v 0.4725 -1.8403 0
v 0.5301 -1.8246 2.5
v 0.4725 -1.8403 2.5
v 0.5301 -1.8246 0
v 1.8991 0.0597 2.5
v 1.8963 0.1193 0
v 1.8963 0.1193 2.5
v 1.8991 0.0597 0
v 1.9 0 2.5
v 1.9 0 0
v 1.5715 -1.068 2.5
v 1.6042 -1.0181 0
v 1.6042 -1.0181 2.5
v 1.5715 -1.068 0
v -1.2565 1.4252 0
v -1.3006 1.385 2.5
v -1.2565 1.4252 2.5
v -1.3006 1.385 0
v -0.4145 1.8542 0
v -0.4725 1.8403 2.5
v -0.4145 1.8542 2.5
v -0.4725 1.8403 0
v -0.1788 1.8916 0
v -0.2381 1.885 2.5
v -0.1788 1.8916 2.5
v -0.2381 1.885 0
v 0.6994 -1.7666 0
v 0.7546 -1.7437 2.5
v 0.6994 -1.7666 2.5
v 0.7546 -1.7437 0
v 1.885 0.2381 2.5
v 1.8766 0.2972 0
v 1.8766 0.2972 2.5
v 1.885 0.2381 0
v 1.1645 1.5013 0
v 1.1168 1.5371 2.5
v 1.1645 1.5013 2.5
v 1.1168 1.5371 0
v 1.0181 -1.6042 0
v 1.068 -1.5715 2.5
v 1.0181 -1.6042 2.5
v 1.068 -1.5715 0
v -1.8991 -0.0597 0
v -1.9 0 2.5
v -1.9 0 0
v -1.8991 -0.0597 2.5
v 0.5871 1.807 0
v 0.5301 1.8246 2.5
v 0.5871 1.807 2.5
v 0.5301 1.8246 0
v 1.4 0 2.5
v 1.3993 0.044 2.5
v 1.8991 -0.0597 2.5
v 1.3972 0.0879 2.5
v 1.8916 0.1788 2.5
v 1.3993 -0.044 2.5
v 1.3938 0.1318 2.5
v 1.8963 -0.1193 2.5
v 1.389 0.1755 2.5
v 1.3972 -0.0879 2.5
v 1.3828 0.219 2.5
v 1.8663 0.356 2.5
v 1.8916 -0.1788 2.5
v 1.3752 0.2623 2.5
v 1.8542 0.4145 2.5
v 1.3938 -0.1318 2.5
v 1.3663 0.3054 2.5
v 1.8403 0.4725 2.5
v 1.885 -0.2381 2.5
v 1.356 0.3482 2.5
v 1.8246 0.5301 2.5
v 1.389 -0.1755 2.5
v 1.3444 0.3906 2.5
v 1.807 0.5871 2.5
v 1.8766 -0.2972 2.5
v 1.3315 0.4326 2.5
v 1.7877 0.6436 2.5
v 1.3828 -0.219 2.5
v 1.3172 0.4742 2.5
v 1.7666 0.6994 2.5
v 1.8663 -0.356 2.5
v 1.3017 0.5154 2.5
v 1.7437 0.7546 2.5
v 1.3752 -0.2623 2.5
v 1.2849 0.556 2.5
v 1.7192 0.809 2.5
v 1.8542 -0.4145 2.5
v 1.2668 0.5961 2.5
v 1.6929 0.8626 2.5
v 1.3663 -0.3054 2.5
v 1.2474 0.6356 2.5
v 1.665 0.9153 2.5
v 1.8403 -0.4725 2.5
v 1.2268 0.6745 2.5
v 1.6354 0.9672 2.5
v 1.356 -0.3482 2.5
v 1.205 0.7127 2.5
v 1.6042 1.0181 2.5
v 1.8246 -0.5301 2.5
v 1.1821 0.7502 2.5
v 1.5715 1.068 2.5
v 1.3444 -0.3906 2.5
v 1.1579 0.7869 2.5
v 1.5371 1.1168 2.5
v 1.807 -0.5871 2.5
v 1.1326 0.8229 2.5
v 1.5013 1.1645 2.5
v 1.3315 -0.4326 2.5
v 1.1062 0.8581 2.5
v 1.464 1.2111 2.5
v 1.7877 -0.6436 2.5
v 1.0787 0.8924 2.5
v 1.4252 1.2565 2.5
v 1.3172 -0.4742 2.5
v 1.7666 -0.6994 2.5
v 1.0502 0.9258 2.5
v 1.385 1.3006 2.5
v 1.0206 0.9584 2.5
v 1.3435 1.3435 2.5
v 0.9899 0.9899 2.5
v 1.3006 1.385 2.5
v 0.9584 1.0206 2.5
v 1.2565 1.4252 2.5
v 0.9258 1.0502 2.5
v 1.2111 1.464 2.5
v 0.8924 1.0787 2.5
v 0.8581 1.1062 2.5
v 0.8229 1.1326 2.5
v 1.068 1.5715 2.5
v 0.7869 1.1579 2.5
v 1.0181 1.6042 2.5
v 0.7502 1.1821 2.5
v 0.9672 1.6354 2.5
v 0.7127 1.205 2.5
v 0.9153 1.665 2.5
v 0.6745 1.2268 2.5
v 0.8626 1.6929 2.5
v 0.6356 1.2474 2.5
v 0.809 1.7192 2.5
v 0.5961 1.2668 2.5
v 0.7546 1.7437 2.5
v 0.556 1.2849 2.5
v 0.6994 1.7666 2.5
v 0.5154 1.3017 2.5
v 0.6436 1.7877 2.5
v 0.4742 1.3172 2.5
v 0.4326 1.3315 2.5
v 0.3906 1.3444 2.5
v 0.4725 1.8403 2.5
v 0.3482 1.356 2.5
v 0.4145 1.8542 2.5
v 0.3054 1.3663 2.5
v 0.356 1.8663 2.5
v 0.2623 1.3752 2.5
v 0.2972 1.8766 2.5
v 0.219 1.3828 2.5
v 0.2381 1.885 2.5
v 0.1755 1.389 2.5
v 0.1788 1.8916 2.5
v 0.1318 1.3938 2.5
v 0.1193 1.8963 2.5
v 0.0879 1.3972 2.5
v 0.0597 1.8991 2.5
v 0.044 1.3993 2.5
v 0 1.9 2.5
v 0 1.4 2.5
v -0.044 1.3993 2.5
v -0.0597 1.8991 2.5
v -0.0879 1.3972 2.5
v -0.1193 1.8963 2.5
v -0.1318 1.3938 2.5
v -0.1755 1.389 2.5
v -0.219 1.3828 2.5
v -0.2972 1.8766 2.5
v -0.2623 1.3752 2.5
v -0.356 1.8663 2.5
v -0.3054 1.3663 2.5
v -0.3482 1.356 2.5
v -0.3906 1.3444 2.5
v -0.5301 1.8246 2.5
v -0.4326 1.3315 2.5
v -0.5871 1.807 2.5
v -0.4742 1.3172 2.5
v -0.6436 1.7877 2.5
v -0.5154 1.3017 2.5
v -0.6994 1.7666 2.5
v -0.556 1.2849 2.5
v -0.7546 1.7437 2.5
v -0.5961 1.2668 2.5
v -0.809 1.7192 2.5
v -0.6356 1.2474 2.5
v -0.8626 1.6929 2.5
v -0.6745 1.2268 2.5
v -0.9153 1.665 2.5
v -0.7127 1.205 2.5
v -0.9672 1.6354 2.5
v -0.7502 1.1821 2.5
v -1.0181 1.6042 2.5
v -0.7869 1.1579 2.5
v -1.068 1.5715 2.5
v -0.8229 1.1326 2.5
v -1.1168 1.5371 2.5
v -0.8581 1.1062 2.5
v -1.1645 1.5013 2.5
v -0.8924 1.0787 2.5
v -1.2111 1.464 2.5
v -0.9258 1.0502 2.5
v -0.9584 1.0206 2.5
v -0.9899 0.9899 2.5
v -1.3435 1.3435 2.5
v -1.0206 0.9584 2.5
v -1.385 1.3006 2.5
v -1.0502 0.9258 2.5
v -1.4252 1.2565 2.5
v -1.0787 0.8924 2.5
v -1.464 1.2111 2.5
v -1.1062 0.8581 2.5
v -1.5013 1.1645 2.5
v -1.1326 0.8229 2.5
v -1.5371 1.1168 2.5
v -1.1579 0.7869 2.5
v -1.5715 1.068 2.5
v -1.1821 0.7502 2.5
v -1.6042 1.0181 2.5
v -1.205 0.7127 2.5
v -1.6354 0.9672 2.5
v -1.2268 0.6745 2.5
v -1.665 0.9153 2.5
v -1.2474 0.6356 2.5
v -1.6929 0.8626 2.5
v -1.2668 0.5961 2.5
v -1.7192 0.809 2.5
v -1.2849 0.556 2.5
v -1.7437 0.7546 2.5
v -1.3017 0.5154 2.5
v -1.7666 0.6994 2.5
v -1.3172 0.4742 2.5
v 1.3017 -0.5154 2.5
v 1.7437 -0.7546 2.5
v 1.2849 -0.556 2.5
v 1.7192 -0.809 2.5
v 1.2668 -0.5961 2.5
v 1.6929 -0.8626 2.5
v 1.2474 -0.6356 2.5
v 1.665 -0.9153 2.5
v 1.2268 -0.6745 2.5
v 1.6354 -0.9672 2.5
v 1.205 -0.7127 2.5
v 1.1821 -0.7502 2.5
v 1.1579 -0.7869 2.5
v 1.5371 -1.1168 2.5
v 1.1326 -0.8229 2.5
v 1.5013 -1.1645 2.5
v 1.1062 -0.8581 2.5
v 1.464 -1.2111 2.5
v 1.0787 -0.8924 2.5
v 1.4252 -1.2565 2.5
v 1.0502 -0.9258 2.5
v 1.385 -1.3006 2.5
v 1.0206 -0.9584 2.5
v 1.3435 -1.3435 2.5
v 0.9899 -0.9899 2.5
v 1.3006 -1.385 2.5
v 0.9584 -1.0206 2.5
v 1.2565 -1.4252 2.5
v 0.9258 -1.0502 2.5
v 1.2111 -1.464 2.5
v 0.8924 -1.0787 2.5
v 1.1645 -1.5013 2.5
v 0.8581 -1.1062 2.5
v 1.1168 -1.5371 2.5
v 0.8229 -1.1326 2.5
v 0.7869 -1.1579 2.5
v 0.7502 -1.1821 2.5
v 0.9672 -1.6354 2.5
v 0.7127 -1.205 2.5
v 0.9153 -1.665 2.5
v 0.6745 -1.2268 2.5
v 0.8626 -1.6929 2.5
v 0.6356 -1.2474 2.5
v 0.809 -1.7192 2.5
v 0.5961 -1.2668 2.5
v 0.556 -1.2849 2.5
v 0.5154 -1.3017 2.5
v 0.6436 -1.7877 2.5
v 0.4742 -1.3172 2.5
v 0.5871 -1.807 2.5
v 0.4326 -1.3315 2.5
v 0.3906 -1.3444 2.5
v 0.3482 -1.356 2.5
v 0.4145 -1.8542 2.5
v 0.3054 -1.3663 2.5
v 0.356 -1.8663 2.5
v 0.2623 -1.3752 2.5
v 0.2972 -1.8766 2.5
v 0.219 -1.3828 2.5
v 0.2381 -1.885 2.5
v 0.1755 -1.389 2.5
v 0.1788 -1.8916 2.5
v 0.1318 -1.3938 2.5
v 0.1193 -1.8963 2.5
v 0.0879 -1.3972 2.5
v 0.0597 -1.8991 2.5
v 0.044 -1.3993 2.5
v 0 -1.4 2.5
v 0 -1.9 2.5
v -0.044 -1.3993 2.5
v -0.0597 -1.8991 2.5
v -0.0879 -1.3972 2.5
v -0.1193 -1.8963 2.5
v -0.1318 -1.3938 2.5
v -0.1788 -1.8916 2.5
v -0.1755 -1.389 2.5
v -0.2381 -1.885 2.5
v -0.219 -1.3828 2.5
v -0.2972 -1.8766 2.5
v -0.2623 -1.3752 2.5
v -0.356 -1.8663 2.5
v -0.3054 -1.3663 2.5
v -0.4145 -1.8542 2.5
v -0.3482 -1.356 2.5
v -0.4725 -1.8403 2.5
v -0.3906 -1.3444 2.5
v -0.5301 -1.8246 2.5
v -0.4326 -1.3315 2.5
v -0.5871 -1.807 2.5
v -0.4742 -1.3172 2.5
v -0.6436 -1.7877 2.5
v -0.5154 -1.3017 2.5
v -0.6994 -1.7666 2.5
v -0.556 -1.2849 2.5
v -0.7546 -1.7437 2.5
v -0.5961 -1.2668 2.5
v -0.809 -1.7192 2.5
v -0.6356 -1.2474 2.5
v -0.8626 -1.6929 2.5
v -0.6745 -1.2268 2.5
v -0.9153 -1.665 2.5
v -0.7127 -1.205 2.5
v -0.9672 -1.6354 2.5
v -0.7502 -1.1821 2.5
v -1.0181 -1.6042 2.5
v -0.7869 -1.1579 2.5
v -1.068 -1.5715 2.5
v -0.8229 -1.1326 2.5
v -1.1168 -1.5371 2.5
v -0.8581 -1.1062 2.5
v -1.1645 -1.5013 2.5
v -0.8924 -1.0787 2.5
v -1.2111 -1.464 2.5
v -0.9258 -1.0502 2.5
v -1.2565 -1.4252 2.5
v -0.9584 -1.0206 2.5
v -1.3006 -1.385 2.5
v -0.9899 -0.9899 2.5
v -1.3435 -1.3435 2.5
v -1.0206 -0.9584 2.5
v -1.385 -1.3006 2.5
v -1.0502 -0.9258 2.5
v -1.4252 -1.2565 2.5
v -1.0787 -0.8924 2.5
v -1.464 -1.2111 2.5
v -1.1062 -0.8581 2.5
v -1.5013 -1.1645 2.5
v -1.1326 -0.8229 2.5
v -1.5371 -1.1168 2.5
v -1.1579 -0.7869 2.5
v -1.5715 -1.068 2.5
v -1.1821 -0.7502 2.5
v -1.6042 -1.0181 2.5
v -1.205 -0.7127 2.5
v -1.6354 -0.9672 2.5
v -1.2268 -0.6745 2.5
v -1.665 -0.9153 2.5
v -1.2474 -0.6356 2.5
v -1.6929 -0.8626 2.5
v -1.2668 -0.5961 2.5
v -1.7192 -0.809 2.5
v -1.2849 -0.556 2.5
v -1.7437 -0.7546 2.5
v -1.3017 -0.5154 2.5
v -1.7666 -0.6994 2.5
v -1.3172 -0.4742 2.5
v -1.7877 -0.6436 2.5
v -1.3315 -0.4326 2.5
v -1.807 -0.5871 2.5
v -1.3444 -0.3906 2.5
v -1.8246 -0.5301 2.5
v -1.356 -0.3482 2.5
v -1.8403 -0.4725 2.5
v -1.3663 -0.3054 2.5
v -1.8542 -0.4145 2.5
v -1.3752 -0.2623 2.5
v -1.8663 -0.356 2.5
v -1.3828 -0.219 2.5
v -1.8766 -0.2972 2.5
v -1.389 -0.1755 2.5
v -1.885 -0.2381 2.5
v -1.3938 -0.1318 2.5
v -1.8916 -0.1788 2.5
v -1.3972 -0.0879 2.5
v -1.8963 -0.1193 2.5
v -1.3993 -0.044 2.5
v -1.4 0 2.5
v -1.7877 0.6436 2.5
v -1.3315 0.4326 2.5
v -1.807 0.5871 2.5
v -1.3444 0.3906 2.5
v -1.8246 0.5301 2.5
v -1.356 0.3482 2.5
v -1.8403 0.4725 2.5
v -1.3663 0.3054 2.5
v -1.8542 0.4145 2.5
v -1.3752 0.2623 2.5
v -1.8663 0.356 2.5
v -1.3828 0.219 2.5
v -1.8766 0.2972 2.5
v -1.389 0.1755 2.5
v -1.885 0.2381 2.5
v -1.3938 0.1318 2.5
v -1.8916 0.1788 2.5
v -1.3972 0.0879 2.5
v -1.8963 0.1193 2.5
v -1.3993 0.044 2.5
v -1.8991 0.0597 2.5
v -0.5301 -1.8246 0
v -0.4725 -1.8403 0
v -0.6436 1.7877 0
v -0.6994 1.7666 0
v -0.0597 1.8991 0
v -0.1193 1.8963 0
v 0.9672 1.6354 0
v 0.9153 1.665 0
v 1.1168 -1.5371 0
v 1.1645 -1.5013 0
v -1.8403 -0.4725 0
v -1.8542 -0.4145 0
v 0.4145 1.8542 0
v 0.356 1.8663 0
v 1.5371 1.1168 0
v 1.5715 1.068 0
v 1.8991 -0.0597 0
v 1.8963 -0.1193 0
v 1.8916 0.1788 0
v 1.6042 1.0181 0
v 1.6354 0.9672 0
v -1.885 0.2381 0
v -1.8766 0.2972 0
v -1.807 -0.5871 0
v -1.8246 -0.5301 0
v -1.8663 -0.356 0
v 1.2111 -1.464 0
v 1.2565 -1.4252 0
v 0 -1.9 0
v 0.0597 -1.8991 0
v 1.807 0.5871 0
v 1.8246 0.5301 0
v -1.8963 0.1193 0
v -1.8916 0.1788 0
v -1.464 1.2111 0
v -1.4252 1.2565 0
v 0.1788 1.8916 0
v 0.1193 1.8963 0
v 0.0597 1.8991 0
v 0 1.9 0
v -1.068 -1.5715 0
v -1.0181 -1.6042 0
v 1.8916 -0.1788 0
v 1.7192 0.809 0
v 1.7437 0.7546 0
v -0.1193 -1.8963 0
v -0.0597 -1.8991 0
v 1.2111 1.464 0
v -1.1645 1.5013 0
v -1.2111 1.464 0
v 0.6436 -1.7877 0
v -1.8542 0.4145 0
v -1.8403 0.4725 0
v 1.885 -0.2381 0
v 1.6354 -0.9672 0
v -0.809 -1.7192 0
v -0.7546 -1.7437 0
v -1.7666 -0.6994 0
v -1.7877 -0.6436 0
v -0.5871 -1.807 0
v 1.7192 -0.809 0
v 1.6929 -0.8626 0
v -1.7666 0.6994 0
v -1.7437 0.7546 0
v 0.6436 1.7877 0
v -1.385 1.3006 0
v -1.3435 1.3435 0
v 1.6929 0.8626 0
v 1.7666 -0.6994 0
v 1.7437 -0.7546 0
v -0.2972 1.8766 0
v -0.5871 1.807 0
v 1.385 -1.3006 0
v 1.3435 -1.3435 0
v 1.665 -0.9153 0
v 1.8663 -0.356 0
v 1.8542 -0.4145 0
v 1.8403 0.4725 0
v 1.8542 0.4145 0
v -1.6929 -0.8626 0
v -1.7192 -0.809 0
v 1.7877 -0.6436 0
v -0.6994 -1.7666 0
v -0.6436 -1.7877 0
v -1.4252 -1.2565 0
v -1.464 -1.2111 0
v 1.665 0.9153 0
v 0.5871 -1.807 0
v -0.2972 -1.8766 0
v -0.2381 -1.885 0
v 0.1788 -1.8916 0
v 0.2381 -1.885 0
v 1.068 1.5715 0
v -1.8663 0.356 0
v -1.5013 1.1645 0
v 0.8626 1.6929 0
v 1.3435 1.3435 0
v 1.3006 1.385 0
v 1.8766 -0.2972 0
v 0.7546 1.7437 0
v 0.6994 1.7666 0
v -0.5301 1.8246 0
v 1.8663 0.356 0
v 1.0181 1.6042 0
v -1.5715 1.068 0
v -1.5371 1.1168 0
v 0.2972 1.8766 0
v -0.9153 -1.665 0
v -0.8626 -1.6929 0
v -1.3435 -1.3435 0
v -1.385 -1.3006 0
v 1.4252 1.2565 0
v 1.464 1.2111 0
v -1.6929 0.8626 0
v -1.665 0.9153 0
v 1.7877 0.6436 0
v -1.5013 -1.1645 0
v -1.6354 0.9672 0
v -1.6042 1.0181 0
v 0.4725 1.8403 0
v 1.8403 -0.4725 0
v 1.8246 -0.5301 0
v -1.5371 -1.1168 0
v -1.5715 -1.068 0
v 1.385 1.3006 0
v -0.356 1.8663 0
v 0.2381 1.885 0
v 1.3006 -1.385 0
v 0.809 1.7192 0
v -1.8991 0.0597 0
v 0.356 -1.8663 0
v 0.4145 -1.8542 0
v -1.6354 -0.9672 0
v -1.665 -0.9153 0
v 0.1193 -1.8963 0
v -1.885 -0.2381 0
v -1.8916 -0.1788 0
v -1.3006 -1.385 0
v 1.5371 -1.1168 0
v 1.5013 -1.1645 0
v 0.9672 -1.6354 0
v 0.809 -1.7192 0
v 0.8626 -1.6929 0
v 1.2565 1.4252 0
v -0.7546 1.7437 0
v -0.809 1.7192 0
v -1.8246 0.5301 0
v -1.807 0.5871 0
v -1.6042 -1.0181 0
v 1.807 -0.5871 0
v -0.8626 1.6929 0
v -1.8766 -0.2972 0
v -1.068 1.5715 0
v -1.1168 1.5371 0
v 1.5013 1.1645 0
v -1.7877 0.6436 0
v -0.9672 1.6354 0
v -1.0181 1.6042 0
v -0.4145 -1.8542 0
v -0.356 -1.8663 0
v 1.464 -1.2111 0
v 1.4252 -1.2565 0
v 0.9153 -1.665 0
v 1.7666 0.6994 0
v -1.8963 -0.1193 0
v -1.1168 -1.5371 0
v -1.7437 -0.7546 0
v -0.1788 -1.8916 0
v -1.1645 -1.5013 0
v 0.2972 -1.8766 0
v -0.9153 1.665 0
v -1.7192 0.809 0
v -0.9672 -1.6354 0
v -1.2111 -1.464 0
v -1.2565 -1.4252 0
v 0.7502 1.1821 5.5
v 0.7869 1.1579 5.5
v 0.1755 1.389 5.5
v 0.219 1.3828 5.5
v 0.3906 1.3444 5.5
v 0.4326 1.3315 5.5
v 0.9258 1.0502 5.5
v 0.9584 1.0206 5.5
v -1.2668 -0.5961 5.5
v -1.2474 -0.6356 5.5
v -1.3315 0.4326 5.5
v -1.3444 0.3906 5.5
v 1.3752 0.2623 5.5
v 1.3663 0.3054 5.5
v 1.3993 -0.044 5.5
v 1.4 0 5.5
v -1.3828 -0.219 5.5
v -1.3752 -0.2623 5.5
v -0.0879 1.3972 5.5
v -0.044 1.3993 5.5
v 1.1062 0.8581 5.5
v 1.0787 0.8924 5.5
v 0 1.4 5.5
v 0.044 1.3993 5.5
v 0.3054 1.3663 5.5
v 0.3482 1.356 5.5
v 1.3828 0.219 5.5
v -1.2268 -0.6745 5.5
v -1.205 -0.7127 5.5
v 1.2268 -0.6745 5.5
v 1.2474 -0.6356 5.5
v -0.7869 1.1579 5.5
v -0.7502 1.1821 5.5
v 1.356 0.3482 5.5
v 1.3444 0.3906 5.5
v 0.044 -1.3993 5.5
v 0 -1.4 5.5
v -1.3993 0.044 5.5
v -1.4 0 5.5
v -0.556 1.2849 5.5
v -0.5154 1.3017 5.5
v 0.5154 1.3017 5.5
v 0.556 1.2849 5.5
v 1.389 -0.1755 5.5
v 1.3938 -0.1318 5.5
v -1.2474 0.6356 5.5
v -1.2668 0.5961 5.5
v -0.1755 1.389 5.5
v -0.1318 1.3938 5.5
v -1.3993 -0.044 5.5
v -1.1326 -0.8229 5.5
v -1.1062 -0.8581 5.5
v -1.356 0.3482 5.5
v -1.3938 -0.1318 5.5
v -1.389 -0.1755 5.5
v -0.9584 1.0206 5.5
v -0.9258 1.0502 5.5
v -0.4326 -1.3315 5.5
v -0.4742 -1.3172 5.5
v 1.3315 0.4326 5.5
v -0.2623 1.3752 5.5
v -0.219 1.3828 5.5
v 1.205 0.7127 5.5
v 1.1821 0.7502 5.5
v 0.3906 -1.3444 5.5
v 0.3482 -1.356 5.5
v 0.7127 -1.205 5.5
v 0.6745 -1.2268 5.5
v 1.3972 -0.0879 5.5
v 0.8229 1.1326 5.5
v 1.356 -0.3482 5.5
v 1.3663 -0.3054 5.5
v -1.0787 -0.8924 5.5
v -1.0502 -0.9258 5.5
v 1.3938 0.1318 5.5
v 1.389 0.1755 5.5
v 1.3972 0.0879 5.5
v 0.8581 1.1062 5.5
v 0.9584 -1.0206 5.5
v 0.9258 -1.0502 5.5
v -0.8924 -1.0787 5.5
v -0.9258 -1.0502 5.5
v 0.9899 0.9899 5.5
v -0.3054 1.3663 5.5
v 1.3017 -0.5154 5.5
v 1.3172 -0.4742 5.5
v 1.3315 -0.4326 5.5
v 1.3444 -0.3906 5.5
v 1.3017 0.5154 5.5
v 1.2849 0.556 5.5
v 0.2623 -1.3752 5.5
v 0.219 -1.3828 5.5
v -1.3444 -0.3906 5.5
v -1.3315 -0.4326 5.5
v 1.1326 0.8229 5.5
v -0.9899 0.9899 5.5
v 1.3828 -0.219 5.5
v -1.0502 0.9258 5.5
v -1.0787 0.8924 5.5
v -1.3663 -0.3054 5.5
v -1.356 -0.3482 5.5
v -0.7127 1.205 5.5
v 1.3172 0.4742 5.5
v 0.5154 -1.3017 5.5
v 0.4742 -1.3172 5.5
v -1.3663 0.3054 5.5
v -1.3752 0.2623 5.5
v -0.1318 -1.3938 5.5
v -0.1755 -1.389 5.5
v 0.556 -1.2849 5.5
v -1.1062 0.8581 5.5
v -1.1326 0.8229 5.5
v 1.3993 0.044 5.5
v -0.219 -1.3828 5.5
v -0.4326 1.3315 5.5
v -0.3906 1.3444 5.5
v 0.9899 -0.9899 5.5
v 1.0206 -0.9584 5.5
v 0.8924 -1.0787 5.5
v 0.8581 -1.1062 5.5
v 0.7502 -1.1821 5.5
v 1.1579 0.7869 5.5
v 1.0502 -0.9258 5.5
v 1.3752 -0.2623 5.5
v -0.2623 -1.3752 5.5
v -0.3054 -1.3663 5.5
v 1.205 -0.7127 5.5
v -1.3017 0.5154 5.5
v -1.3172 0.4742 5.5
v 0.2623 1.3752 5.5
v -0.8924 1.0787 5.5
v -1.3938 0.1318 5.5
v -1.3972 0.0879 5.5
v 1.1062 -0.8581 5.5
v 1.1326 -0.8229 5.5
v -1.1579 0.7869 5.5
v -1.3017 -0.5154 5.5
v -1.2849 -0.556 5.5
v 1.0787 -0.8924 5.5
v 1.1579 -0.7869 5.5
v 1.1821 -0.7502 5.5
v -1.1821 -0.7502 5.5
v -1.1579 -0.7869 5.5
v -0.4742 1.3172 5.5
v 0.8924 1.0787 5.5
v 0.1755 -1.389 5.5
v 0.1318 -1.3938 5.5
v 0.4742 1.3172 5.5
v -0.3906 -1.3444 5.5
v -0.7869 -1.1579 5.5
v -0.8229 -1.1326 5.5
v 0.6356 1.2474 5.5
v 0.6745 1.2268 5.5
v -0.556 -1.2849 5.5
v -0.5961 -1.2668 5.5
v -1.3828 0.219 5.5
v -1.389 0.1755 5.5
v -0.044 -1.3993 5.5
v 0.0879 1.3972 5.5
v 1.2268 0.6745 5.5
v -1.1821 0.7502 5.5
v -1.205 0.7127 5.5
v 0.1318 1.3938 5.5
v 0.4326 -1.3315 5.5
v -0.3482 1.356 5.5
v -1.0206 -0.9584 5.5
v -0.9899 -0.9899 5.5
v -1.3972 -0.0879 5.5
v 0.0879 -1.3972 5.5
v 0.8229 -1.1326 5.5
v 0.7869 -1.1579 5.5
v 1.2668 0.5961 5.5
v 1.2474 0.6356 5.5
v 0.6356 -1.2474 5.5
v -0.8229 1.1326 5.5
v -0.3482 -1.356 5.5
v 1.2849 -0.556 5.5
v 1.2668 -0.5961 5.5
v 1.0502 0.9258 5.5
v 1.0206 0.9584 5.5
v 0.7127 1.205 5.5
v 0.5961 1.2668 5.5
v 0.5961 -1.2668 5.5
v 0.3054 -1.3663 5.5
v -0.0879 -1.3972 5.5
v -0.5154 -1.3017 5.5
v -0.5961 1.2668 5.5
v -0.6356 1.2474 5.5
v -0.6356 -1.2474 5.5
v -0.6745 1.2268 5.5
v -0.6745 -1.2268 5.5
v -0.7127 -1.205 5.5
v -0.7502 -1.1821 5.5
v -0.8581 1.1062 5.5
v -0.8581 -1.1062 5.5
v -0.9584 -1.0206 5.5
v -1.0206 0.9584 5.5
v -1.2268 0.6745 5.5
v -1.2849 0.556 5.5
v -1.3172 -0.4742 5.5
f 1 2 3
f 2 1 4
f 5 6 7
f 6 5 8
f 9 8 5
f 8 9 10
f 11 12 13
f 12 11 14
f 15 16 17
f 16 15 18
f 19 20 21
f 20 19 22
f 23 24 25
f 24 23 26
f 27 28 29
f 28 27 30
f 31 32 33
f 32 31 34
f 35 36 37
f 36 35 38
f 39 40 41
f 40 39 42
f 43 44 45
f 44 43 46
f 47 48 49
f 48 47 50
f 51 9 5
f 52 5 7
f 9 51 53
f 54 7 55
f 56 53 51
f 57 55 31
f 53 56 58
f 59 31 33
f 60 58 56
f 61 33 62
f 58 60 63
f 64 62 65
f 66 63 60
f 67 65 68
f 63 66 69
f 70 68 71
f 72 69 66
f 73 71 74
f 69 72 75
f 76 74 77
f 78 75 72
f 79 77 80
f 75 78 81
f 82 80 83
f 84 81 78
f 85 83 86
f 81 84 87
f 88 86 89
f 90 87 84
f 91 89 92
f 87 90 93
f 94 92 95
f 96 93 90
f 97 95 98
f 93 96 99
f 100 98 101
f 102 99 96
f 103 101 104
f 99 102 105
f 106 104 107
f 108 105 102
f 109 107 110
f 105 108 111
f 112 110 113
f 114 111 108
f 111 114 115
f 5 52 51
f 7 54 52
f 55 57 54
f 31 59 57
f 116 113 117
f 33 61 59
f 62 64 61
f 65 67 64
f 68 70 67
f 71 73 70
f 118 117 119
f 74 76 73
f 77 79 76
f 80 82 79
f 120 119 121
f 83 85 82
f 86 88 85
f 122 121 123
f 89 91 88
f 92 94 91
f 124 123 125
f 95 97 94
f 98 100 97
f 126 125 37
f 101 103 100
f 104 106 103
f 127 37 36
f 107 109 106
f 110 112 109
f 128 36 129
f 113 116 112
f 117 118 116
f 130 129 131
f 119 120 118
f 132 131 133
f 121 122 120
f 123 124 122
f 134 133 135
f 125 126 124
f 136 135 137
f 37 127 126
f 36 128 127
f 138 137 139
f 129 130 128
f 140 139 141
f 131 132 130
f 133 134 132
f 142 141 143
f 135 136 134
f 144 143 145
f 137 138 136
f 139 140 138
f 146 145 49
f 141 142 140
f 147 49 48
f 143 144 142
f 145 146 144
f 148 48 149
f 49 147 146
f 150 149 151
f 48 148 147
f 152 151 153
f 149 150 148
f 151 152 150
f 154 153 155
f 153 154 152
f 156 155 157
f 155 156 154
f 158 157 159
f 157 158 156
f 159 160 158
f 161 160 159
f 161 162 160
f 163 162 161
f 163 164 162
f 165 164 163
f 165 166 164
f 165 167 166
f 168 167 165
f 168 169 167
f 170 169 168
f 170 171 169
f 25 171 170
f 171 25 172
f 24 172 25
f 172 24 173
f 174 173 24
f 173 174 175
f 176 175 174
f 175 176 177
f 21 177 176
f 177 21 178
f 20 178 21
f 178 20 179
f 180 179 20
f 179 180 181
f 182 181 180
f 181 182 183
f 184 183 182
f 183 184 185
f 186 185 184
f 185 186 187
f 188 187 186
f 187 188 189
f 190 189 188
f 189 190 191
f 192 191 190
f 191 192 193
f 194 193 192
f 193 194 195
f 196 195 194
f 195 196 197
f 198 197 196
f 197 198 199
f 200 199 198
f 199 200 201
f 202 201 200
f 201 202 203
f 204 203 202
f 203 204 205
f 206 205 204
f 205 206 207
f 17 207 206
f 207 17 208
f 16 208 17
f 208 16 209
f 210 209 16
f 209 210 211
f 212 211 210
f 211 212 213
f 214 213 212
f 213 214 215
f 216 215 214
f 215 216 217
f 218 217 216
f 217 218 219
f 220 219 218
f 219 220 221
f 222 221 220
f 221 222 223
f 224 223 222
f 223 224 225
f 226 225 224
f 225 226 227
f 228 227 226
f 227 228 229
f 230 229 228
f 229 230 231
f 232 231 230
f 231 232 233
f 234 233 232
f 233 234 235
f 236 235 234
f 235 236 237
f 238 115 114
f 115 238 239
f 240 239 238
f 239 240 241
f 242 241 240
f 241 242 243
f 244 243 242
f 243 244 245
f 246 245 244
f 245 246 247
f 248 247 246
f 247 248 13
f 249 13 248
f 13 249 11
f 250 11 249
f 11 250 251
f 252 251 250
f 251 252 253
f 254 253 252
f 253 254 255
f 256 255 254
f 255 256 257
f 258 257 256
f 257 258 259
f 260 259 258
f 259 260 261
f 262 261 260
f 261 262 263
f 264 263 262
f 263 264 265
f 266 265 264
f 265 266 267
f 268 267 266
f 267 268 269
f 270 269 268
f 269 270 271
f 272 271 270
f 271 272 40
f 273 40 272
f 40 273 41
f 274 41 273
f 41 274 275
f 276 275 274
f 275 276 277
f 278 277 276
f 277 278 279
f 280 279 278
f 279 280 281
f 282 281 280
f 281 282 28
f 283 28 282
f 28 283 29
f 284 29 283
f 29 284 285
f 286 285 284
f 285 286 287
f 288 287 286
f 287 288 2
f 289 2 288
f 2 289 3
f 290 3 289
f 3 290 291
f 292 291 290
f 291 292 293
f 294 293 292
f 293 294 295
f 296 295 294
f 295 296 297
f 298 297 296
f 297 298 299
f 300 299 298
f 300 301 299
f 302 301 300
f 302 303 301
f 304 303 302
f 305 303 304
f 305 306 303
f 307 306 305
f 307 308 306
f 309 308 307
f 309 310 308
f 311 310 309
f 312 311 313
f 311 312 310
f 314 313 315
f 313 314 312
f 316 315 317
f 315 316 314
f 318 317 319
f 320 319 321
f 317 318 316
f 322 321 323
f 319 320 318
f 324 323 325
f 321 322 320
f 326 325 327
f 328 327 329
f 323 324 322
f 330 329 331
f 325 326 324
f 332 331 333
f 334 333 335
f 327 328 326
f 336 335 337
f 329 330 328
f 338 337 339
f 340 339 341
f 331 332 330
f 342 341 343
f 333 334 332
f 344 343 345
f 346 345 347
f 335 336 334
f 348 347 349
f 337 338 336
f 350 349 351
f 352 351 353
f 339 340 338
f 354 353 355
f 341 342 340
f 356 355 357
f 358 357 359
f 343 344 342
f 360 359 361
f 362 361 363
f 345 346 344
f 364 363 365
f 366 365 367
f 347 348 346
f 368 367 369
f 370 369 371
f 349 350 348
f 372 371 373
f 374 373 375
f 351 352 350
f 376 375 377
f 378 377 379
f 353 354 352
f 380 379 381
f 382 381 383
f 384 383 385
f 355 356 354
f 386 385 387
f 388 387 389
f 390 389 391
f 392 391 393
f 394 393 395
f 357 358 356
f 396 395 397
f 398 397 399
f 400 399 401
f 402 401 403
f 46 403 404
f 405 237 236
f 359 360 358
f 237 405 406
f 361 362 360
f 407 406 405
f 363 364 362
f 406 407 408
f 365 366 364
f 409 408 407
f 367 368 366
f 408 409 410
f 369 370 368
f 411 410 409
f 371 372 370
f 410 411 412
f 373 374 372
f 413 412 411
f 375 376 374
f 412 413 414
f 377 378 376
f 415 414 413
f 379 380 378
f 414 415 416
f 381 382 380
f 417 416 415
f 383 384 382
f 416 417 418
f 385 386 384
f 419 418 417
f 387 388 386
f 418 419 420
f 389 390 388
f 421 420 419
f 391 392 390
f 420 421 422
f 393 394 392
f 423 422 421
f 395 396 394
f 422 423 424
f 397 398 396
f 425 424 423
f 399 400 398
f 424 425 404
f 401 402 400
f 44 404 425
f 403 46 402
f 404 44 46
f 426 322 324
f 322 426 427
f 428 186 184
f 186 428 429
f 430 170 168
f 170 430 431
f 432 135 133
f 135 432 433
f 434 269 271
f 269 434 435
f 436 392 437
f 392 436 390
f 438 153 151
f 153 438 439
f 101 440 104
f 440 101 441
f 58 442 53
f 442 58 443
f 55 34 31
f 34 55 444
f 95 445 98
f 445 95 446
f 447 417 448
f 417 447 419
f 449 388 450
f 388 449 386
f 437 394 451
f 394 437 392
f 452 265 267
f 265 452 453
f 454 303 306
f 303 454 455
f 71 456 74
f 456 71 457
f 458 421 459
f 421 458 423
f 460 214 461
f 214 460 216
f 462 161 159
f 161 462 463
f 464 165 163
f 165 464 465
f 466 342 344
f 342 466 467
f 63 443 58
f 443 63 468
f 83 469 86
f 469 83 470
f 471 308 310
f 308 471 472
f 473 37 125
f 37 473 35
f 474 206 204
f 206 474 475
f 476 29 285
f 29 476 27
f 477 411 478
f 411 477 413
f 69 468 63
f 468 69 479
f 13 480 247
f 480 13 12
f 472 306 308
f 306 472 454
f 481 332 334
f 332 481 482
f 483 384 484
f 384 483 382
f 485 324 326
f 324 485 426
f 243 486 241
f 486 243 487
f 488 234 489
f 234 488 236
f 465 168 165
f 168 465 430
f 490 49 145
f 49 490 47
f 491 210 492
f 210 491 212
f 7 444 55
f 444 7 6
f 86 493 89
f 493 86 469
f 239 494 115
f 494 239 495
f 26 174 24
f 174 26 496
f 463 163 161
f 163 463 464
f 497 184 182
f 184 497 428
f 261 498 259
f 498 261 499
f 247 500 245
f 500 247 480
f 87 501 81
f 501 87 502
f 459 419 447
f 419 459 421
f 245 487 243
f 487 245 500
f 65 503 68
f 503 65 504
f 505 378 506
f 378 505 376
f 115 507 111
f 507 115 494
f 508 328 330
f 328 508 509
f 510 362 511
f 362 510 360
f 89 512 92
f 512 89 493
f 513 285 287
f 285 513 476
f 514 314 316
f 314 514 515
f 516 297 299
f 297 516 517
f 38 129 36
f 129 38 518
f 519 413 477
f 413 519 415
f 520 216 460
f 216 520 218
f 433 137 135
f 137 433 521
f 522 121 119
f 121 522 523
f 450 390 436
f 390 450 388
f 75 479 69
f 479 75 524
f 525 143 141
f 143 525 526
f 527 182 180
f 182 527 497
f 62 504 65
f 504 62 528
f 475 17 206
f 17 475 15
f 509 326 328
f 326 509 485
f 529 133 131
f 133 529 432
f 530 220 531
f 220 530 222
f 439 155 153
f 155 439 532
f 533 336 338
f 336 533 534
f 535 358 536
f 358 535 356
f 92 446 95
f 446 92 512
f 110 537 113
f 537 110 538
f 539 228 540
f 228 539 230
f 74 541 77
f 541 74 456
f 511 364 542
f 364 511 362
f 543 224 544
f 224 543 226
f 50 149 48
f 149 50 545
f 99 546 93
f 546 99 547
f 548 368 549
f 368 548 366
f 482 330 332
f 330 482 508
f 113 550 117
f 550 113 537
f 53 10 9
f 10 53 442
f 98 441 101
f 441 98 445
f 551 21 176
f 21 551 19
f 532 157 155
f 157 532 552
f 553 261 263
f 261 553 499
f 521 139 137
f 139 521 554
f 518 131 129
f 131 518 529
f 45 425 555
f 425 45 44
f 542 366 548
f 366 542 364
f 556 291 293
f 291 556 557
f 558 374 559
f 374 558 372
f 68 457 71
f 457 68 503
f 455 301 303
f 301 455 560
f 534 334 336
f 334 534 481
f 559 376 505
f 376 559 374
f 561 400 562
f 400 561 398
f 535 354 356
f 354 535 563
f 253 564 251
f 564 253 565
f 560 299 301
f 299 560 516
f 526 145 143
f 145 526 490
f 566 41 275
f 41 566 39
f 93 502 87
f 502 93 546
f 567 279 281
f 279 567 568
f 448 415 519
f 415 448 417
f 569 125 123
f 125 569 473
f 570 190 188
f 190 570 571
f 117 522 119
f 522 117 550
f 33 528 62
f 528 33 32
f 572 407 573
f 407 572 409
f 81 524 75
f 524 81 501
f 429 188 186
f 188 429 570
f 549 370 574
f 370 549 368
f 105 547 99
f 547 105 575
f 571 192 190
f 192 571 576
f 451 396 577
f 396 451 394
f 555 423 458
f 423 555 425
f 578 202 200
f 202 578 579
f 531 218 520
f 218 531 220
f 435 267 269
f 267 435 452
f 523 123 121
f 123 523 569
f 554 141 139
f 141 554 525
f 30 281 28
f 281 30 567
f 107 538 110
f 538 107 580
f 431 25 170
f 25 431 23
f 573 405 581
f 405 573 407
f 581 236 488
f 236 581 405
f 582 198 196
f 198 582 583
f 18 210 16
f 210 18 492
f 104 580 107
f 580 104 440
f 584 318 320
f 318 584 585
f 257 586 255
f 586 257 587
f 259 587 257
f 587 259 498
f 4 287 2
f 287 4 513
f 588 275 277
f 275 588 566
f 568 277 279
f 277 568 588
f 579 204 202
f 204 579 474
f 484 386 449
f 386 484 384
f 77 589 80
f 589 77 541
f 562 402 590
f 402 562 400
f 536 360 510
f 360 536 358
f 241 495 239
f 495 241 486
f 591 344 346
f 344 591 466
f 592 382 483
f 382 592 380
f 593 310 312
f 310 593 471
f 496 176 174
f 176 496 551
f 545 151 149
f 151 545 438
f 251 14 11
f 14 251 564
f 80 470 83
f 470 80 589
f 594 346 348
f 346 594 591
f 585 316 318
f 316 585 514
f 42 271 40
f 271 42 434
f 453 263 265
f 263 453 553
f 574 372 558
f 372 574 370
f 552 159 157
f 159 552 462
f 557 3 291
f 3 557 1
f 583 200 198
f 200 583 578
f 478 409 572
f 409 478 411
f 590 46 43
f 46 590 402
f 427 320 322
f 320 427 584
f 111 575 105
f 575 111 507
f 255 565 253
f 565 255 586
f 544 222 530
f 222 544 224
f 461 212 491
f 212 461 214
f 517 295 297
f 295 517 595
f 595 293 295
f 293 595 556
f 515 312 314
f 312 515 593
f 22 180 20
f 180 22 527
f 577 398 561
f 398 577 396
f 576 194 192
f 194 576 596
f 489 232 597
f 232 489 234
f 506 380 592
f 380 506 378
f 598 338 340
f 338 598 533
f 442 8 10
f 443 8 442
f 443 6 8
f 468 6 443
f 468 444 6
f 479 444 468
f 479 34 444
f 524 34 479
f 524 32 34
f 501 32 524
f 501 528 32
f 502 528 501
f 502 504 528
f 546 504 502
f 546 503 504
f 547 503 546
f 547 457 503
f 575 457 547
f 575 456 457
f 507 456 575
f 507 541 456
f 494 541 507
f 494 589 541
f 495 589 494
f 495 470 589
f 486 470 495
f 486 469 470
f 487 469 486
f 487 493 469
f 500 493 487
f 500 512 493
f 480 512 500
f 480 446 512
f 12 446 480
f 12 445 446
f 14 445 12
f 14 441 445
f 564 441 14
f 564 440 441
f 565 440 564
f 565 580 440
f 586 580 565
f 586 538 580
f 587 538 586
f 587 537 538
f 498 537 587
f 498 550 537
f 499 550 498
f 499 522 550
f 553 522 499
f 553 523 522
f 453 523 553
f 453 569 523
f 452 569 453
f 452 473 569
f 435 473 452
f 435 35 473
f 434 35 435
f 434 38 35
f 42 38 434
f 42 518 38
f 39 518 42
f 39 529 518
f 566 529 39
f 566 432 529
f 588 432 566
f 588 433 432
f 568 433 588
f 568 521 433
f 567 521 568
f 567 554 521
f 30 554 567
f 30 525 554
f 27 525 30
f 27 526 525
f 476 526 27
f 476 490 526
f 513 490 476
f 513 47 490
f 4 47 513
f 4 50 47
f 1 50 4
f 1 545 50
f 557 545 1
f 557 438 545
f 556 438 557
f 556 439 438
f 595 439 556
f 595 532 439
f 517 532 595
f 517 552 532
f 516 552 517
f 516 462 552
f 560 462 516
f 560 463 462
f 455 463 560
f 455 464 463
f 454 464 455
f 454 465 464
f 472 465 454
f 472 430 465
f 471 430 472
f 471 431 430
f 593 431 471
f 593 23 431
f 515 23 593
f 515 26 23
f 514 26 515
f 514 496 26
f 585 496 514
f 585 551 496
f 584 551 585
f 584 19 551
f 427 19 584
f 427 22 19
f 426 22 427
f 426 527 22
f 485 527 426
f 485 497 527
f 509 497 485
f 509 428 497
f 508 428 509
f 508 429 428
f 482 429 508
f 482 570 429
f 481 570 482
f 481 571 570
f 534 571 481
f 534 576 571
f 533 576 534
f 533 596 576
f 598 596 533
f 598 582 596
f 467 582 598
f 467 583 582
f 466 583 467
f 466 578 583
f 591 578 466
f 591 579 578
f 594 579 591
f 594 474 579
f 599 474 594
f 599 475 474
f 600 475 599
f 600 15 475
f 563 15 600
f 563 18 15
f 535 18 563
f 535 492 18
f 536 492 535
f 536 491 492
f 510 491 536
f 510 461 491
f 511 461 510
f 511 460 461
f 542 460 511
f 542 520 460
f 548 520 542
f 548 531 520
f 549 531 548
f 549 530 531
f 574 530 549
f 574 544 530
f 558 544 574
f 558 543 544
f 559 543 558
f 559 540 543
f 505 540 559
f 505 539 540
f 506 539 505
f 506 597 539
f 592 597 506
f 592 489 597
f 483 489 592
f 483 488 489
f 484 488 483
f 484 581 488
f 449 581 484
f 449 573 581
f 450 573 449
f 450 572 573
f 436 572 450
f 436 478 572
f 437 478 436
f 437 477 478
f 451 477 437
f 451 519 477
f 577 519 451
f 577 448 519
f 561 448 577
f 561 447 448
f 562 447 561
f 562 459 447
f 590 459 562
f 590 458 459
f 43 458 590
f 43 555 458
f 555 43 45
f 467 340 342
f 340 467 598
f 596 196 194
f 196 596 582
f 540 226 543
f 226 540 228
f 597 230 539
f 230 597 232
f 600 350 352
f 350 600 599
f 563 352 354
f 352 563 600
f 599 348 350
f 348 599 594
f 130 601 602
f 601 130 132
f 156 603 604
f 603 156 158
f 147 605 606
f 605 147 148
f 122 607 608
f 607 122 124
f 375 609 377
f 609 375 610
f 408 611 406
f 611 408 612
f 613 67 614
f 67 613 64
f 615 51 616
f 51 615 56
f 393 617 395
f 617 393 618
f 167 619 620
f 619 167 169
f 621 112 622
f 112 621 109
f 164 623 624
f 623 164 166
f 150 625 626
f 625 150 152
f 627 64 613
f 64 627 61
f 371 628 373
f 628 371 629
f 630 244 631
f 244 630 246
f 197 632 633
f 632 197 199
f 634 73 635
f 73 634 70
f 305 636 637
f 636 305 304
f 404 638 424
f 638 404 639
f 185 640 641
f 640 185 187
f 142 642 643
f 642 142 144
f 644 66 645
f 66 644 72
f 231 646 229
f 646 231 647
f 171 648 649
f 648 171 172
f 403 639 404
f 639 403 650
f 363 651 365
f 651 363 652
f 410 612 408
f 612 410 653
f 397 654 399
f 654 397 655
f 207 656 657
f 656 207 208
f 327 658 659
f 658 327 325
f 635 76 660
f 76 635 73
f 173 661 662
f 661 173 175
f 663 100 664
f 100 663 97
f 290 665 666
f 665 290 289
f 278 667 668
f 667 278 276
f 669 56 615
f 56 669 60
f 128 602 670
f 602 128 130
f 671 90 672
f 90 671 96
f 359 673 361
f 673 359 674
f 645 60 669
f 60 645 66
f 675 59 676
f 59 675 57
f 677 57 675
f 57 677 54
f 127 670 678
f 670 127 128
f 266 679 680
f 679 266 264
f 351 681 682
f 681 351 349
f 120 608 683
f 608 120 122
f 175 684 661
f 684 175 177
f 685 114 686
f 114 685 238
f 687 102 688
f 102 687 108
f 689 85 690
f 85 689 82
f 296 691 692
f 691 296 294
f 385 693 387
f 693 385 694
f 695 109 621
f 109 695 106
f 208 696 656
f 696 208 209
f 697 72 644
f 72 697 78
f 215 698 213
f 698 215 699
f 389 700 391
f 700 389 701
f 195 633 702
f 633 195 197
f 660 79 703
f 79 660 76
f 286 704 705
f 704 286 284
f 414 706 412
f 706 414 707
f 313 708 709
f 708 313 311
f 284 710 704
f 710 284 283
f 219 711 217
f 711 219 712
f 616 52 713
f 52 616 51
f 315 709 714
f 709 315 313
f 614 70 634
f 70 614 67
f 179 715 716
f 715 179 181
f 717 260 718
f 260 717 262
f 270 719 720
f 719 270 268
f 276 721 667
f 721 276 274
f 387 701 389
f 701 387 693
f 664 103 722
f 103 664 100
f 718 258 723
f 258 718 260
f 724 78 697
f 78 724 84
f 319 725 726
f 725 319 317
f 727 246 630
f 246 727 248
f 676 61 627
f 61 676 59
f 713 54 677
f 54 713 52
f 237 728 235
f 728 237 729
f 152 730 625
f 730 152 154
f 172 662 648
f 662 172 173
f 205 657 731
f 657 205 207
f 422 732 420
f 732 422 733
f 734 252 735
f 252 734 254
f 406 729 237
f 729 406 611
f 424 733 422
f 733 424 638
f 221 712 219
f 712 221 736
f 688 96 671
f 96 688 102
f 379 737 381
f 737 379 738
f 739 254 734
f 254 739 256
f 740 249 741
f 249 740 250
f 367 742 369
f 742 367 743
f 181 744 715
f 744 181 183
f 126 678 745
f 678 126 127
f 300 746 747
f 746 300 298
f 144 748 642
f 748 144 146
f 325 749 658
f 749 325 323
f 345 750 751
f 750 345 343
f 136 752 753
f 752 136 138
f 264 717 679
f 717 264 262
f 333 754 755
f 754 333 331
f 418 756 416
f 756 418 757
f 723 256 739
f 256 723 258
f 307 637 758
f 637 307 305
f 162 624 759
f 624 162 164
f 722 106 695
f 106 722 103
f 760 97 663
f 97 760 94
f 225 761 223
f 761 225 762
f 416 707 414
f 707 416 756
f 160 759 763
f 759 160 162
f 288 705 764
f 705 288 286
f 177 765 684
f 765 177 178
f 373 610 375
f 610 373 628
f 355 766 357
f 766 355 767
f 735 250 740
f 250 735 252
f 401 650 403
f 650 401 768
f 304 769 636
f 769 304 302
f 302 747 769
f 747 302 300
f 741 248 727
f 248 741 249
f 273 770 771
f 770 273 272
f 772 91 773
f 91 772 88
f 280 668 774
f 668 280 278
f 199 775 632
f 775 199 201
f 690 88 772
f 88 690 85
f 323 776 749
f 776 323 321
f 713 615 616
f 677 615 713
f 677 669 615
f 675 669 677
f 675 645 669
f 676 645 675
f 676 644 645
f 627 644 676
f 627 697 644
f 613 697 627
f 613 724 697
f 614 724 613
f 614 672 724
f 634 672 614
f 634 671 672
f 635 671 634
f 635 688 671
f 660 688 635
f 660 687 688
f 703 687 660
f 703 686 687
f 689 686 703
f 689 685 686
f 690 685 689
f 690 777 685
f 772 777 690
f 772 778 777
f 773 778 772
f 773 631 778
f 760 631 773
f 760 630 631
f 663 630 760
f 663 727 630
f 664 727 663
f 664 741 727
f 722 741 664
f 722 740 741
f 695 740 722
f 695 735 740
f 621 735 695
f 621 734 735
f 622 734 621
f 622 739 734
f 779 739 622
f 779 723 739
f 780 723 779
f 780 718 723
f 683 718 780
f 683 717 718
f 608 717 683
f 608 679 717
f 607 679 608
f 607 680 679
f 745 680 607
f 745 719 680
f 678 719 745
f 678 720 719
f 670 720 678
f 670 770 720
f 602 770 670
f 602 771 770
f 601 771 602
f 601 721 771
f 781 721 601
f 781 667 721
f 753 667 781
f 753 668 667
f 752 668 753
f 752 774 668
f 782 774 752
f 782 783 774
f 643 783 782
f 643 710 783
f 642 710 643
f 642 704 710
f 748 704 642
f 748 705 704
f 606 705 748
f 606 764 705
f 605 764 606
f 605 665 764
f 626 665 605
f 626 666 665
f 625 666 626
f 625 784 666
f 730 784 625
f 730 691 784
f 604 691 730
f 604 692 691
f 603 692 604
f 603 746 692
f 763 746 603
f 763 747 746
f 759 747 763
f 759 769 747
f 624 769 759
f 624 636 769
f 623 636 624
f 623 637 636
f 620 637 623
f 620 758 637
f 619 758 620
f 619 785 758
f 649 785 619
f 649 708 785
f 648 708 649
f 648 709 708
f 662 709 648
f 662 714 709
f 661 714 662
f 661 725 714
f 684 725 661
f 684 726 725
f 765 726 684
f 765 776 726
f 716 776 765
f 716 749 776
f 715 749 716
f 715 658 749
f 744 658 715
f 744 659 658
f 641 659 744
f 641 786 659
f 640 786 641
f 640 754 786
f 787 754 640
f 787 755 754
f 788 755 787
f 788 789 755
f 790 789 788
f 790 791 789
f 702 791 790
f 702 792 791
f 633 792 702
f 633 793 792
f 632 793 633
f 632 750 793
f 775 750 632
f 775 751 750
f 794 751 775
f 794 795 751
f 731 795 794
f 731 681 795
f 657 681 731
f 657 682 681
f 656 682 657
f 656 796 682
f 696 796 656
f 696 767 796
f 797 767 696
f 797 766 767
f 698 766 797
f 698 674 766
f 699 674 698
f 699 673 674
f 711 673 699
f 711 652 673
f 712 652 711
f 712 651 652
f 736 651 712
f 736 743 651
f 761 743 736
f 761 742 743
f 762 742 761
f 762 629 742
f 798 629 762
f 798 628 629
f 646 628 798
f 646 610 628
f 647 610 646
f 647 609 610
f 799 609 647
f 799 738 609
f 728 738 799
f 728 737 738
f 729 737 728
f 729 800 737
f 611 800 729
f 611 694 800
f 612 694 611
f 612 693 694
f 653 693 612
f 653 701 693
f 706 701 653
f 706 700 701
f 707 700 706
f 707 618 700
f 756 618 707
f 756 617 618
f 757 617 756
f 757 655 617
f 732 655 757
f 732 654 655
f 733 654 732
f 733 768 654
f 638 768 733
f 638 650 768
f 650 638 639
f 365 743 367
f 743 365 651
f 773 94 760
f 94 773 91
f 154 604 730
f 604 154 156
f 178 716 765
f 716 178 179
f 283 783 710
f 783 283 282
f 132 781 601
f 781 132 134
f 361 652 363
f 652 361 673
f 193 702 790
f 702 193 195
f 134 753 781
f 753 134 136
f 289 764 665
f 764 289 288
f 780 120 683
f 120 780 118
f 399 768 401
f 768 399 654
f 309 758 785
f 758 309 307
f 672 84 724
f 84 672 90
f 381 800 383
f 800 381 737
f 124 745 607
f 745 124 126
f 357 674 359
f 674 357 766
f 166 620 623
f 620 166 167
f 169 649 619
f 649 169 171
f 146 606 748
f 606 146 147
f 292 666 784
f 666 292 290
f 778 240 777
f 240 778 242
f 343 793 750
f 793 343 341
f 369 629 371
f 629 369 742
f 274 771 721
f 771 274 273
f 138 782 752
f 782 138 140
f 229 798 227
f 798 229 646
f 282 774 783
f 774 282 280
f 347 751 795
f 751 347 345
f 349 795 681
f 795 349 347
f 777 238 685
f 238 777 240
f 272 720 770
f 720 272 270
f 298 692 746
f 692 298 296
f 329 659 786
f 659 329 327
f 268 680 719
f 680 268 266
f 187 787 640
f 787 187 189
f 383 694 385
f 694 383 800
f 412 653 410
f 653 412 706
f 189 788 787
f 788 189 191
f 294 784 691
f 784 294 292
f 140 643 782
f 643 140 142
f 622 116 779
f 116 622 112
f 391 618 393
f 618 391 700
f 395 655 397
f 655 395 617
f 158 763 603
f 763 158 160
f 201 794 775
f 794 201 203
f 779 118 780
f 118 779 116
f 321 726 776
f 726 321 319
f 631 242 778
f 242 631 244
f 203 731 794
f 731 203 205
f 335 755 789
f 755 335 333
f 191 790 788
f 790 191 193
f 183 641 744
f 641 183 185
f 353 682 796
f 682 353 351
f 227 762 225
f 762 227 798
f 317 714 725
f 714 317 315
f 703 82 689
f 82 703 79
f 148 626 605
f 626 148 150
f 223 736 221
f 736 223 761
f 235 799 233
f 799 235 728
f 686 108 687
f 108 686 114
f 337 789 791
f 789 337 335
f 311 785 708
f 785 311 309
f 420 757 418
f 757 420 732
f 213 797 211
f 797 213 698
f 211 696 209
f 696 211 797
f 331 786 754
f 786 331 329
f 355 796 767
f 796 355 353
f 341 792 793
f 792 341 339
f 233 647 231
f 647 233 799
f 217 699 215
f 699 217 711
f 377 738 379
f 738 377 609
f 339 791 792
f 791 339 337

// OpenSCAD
$fn = 200;
union(){
    cylinder(2.5,1.9,1.9);
    cylinder(5.5,1.4,1.4);
}
